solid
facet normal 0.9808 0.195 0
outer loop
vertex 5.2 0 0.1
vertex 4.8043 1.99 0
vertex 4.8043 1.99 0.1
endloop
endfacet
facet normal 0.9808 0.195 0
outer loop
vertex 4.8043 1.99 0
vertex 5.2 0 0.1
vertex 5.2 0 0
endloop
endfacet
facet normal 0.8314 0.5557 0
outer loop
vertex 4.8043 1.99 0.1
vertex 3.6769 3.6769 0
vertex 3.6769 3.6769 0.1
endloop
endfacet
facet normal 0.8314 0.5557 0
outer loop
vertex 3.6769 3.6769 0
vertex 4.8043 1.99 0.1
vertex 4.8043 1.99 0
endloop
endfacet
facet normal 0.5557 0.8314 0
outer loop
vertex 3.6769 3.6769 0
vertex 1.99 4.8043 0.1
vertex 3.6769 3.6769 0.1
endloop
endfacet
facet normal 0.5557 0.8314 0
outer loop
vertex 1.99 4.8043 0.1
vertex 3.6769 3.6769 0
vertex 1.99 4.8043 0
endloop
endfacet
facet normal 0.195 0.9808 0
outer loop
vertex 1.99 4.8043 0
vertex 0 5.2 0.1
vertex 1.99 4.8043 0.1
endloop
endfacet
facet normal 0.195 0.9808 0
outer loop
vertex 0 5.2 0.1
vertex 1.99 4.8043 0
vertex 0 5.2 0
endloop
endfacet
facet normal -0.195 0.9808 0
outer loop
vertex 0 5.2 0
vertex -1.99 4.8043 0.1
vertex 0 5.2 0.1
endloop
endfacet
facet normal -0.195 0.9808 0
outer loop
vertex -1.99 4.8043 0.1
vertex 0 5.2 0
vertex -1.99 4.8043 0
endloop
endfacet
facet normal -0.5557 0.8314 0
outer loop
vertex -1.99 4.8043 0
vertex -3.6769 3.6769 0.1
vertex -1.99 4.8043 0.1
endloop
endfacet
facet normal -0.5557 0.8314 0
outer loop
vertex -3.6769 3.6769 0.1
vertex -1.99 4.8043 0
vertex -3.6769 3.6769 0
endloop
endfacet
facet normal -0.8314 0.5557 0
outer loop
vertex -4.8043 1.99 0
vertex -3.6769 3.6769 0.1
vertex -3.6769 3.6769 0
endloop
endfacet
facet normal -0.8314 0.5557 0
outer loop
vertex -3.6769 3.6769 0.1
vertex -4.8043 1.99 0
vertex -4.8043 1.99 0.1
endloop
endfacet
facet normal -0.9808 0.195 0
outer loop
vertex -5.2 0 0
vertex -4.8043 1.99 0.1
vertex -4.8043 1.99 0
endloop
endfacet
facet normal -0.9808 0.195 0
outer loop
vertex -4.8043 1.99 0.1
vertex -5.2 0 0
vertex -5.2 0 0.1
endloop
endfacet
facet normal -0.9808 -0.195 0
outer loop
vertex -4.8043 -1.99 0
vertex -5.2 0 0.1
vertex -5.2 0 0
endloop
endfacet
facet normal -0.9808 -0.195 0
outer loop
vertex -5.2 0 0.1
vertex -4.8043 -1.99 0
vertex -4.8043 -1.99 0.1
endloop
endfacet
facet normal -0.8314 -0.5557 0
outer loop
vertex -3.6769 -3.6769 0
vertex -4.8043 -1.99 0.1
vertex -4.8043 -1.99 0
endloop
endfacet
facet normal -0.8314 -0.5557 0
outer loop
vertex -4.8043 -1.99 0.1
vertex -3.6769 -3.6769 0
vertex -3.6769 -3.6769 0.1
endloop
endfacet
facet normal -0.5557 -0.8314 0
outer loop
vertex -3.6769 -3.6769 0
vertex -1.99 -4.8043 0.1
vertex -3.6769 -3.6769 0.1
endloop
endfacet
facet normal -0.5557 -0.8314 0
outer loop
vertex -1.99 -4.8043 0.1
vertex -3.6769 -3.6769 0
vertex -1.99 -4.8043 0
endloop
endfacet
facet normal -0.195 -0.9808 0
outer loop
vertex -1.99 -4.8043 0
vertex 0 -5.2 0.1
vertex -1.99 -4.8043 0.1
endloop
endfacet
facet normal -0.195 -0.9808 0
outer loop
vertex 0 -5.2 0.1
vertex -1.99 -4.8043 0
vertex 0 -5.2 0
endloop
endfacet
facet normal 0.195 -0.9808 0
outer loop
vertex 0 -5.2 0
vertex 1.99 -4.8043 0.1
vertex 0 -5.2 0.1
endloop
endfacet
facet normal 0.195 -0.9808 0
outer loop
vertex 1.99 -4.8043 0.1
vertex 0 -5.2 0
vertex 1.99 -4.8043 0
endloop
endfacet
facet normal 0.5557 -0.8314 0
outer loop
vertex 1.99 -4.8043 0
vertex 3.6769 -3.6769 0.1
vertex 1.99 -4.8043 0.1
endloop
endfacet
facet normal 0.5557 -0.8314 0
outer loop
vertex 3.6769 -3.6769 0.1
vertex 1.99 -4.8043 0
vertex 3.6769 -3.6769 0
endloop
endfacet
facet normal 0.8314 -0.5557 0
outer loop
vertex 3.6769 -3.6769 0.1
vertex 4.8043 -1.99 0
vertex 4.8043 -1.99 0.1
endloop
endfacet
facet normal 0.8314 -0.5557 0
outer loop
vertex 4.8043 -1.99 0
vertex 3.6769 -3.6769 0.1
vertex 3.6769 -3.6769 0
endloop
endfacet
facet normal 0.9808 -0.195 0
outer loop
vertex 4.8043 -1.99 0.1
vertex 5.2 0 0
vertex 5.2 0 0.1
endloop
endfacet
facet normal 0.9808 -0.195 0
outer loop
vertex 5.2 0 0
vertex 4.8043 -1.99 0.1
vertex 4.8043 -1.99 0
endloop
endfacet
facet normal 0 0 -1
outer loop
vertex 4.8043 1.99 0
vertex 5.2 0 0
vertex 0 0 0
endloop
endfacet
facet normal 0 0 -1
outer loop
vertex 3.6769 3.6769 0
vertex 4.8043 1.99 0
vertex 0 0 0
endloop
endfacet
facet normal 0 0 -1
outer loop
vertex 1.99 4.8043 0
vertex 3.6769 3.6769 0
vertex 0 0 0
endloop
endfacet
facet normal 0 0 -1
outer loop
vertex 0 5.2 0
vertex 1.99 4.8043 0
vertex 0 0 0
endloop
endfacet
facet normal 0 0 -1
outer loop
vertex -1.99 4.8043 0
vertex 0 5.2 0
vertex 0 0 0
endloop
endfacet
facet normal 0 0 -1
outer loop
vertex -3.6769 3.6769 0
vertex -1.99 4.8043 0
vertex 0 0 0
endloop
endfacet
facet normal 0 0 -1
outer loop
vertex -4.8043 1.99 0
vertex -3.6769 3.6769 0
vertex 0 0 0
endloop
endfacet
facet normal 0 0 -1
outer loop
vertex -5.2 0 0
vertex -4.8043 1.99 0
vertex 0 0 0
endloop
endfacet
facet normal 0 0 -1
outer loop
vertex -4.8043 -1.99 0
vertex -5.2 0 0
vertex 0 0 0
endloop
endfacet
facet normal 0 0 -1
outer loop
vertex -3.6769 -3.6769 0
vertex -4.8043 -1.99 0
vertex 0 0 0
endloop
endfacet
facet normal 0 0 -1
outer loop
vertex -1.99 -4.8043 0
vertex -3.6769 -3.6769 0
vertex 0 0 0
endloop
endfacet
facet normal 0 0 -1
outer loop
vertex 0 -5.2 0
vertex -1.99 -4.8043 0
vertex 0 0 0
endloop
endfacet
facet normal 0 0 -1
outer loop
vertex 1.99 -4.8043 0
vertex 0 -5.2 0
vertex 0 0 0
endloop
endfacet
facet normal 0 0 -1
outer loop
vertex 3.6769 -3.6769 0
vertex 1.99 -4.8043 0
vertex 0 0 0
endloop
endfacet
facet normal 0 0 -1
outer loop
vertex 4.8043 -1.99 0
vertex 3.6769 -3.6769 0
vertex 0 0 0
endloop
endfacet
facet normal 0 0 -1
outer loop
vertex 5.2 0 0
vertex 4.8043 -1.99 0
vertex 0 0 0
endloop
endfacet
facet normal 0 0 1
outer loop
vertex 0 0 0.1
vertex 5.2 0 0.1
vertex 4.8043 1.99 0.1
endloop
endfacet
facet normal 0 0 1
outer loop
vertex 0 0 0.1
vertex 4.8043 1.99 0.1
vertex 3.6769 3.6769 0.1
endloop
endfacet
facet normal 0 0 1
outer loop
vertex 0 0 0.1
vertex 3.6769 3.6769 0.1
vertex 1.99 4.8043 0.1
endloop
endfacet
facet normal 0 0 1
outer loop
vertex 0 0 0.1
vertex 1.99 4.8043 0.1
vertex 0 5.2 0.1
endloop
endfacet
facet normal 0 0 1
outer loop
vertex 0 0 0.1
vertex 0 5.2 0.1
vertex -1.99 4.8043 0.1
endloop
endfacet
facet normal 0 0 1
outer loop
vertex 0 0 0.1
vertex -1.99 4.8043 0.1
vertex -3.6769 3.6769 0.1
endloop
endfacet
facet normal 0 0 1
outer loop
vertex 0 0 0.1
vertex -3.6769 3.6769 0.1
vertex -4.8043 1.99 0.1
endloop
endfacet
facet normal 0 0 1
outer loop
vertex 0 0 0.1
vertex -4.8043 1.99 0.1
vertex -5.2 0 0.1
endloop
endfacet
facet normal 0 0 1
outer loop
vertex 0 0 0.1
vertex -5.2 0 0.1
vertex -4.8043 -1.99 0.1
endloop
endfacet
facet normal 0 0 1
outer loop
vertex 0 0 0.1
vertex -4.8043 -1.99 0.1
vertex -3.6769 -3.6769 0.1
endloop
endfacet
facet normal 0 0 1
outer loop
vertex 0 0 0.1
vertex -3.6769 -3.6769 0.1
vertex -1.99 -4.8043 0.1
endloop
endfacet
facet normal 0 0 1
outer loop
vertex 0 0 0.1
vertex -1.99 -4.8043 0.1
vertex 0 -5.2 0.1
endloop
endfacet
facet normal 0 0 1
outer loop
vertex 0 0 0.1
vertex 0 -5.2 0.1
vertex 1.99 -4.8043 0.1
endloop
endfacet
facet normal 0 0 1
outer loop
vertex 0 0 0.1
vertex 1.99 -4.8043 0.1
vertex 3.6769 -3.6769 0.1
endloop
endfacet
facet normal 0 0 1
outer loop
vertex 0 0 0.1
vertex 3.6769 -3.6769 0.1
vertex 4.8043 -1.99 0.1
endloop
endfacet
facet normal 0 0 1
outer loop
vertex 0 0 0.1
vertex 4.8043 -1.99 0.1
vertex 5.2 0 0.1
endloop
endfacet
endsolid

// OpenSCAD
// file: ../p/4-4disc.scad
use <../lib.scad>
function ldraw_lib__4_4disc() = [
// 0 Disc 1.0
// 0 Name: 4-4disc.dat
// 0 Author: James Jessiman
// 0 !LDRAW_ORG Primitive UPDATE 2002-02
// 0 !LICENSE Licensed under CC BY 2.0 and CC BY 4.0 : see CAreadme.txt
// 
// 0 BFC CERTIFY CCW
  [0,"BFC","CERTIFY"],
  [0,"BFC","CCW"],
// 
// 0 !HISTORY 1998-12-15 [PTadmin] Official Update 1998-10
// 0 !HISTORY 2002-03-23 [sbliss] Added BFC statement
// 0 !HISTORY 2002-04-25 [PTadmin] Official Update 2002-02
// 0 !HISTORY 2007-06-24 [PTadmin] Header formatted for Contributor Agreement
// 0 !HISTORY 2008-07-01 [PTadmin] Official Update 2008-01
// 
// 
// 3 16 0 0 0 1 0 0 0.9239 0 0.3827
  [3,16,0,0,0,1,0,0,0.9239,0,0.3827],
// 3 16 0 0 0 0.9239 0 0.3827 0.7071 0 0.7071
  [3,16,0,0,0,0.9239,0,0.3827,0.7071,0,0.7071],
// 3 16 0 0 0 0.7071 0 0.7071 0.3827 0 0.9239
  [3,16,0,0,0,0.7071,0,0.7071,0.3827,0,0.9239],
// 3 16 0 0 0 0.3827 0 0.9239 0 0 1
  [3,16,0,0,0,0.3827,0,0.9239,0,0,1],
// 3 16 0 0 0 0 0 1 -0.3827 0 0.9239
  [3,16,0,0,0,0,0,1,-0.3827,0,0.9239],
// 3 16 0 0 0 -0.3827 0 0.9239 -0.7071 0 0.7071
  [3,16,0,0,0,-0.3827,0,0.9239,-0.7071,0,0.7071],
// 3 16 0 0 0 -0.7071 0 0.7071 -0.9239 0 0.3827
  [3,16,0,0,0,-0.7071,0,0.7071,-0.9239,0,0.3827],
// 3 16 0 0 0 -0.9239 0 0.3827 -1 0 -0
  [3,16,0,0,0,-0.9239,0,0.3827,-1,0,-0],
// 3 16 0 0 0 -1 0 -0 -0.9239 0 -0.3827
  [3,16,0,0,0,-1,0,-0,-0.9239,0,-0.3827],
// 3 16 0 0 0 -0.9239 0 -0.3827 -0.7071 0 -0.7071
  [3,16,0,0,0,-0.9239,0,-0.3827,-0.7071,0,-0.7071],
// 3 16 0 0 0 -0.7071 0 -0.7071 -0.3827 0 -0.9239
  [3,16,0,0,0,-0.7071,0,-0.7071,-0.3827,0,-0.9239],
// 3 16 0 0 0 -0.3827 0 -0.9239 0 0 -1
  [3,16,0,0,0,-0.3827,0,-0.9239,0,0,-1],
// 3 16 0 0 0 0 0 -1 0.3827 0 -0.9239
  [3,16,0,0,0,0,0,-1,0.3827,0,-0.9239],
// 3 16 0 0 0 0.3827 0 -0.9239 0.7071 0 -0.7071
  [3,16,0,0,0,0.3827,0,-0.9239,0.7071,0,-0.7071],
// 3 16 0 0 0 0.7071 0 -0.7071 0.9239 0 -0.3827
  [3,16,0,0,0,0.7071,0,-0.7071,0.9239,0,-0.3827],
// 3 16 0 0 0 0.9239 0 -0.3827 1 0 0
  [3,16,0,0,0,0.9239,0,-0.3827,1,0,0],
// 0
];
module ldraw_lib__4_4disc(step=0, col=false, unit=2/5, alt=false, line=0.2, solid=!$preview)
    makepoly(ldraw_lib__4_4disc(), step=step, col=col, unit=unit, alt=alt, line=line, solid=solid);
ldraw_lib__4_4disc(line=0.2);
// file: ../p/4-4cyli.scad
use <../lib.scad>
function ldraw_lib__4_4cyli() = [
// 0 Cylinder 1.0
// 0 Name: 4-4cyli.dat
// 0 Author: James Jessiman
// 0 !LDRAW_ORG Primitive UPDATE 2005-01
// 0 !LICENSE Licensed under CC BY 2.0 and CC BY 4.0 : see CAreadme.txt
// 
// 0 BFC CERTIFY CCW
  [0,"BFC","CERTIFY"],
  [0,"BFC","CCW"],
// 
// 0 !HISTORY 1998-12-15 [PTadmin] Official Update 1998-10
// 0 !HISTORY 2002-03-23 [sbliss] Added BFC statement; merged headers from files in distributions LDraw 0.27 and Complete.
// 0 !HISTORY 2002-04-25 [PTadmin] Official Update 2002-02
// 0 !HISTORY 2004-12-14 [guyvivan] BFC CCW
// 0 !HISTORY 2005-12-28 [PTadmin] Official Update 2005-01
// 0 !HISTORY 2007-06-24 [PTadmin] Header formatted for Contributor Agreement
// 0 !HISTORY 2008-07-01 [PTadmin] Official Update 2008-01
// 
// 
// 4 16 1 1 0 0.9239 1 0.3827 0.9239 0 0.3827 1 0 0
  [4,16,1,1,0,0.9239,1,0.3827,0.9239,0,0.3827,1,0,0],
// 5 24 1 0 0 1 1 0 0.9239 0 0.3827 0.9239 0 -0.3827
  [5,24,1,0,0,1,1,0,0.9239,0,0.3827,0.9239,0,-0.3827],
// 4 16 0.9239 1 0.3827 0.7071 1 0.7071 0.7071 0 0.7071 0.9239 0 0.3827
  [4,16,0.9239,1,0.3827,0.7071,1,0.7071,0.7071,0,0.7071,0.9239,0,0.3827],
// 5 24 0.9239 0 0.3827 0.9239 1 0.3827 0.7071 0 0.7071 1 0 0
  [5,24,0.9239,0,0.3827,0.9239,1,0.3827,0.7071,0,0.7071,1,0,0],
// 4 16 0.7071 1 0.7071 0.3827 1 0.9239 0.3827 0 0.9239 0.7071 0 0.7071
  [4,16,0.7071,1,0.7071,0.3827,1,0.9239,0.3827,0,0.9239,0.7071,0,0.7071],
// 5 24 0.7071 0 0.7071 0.7071 1 0.7071 0.3827 0 0.9239 0.9239 0 0.3827
  [5,24,0.7071,0,0.7071,0.7071,1,0.7071,0.3827,0,0.9239,0.9239,0,0.3827],
// 4 16 0.3827 1 0.9239 0 1 1 0 0 1 0.3827 0 0.9239
  [4,16,0.3827,1,0.9239,0,1,1,0,0,1,0.3827,0,0.9239],
// 5 24 0.3827 0 0.9239 0.3827 1 0.9239 0 0 1 0.7071 0 0.7071
  [5,24,0.3827,0,0.9239,0.3827,1,0.9239,0,0,1,0.7071,0,0.7071],
// 4 16 0 1 1 -0.3827 1 0.9239 -0.3827 0 0.9239 0 0 1
  [4,16,0,1,1,-0.3827,1,0.9239,-0.3827,0,0.9239,0,0,1],
// 5 24 0 0 1 0 1 1 -0.3827 0 0.9239 0.3827 0 0.9239
  [5,24,0,0,1,0,1,1,-0.3827,0,0.9239,0.3827,0,0.9239],
// 4 16 -0.3827 1 0.9239 -0.7071 1 0.7071 -0.7071 0 0.7071 -0.3827 0 0.9239
  [4,16,-0.3827,1,0.9239,-0.7071,1,0.7071,-0.7071,0,0.7071,-0.3827,0,0.9239],
// 5 24 -0.3827 0 0.9239 -0.3827 1 0.9239 -0.7071 0 0.7071 0 0 1
  [5,24,-0.3827,0,0.9239,-0.3827,1,0.9239,-0.7071,0,0.7071,0,0,1],
// 4 16 -0.7071 1 0.7071 -0.9239 1 0.3827 -0.9239 0 0.3827 -0.7071 0 0.7071
  [4,16,-0.7071,1,0.7071,-0.9239,1,0.3827,-0.9239,0,0.3827,-0.7071,0,0.7071],
// 5 24 -0.7071 0 0.7071 -0.7071 1 0.7071 -0.9239 0 0.3827 -0.3827 0 0.9239
  [5,24,-0.7071,0,0.7071,-0.7071,1,0.7071,-0.9239,0,0.3827,-0.3827,0,0.9239],
// 4 16 -0.9239 1 0.3827 -1 1 0 -1 0 0 -0.9239 0 0.3827
  [4,16,-0.9239,1,0.3827,-1,1,0,-1,0,0,-0.9239,0,0.3827],
// 5 24 -0.9239 0 0.3827 -0.9239 1 0.3827 -1 0 0 -0.7071 0 0.7071
  [5,24,-0.9239,0,0.3827,-0.9239,1,0.3827,-1,0,0,-0.7071,0,0.7071],
// 4 16 -1 1 0 -0.9239 1 -0.3827 -0.9239 0 -0.3827 -1 0 0
  [4,16,-1,1,0,-0.9239,1,-0.3827,-0.9239,0,-0.3827,-1,0,0],
// 5 24 -1 0 0 -1 1 0 -0.9239 0 -0.3827 -0.9239 0 0.3827
  [5,24,-1,0,0,-1,1,0,-0.9239,0,-0.3827,-0.9239,0,0.3827],
// 4 16 -0.9239 1 -0.3827 -0.7071 1 -0.7071 -0.7071 0 -0.7071 -0.9239 0 -0.3827
  [4,16,-0.9239,1,-0.3827,-0.7071,1,-0.7071,-0.7071,0,-0.7071,-0.9239,0,-0.3827],
// 5 24 -0.9239 0 -0.3827 -0.9239 1 -0.3827 -0.7071 0 -0.7071 -1 0 0
  [5,24,-0.9239,0,-0.3827,-0.9239,1,-0.3827,-0.7071,0,-0.7071,-1,0,0],
// 4 16 -0.7071 1 -0.7071 -0.3827 1 -0.9239 -0.3827 0 -0.9239 -0.7071 0 -0.7071
  [4,16,-0.7071,1,-0.7071,-0.3827,1,-0.9239,-0.3827,0,-0.9239,-0.7071,0,-0.7071],
// 5 24 -0.7071 0 -0.7071 -0.7071 1 -0.7071 -0.3827 0 -0.9239 -0.9239 0 -0.3827
  [5,24,-0.7071,0,-0.7071,-0.7071,1,-0.7071,-0.3827,0,-0.9239,-0.9239,0,-0.3827],
// 4 16 -0.3827 1 -0.9239 0 1 -1 0 0 -1 -0.3827 0 -0.9239
  [4,16,-0.3827,1,-0.9239,0,1,-1,0,0,-1,-0.3827,0,-0.9239],
// 5 24 -0.3827 0 -0.9239 -0.3827 1 -0.9239 0 0 -1 -0.7071 0 -0.7071
  [5,24,-0.3827,0,-0.9239,-0.3827,1,-0.9239,0,0,-1,-0.7071,0,-0.7071],
// 4 16 0 1 -1 0.3827 1 -0.9239 0.3827 0 -0.9239 0 0 -1
  [4,16,0,1,-1,0.3827,1,-0.9239,0.3827,0,-0.9239,0,0,-1],
// 5 24 0 0 -1 0 1 -1 0.3827 0 -0.9239 -0.3827 0 -0.9239
  [5,24,0,0,-1,0,1,-1,0.3827,0,-0.9239,-0.3827,0,-0.9239],
// 4 16 0.3827 1 -0.9239 0.7071 1 -0.7071 0.7071 0 -0.7071 0.3827 0 -0.9239
  [4,16,0.3827,1,-0.9239,0.7071,1,-0.7071,0.7071,0,-0.7071,0.3827,0,-0.9239],
// 5 24 0.3827 0 -0.9239 0.3827 1 -0.9239 0.7071 0 -0.7071 0 0 -1
  [5,24,0.3827,0,-0.9239,0.3827,1,-0.9239,0.7071,0,-0.7071,0,0,-1],
// 4 16 0.7071 1 -0.7071 0.9239 1 -0.3827 0.9239 0 -0.3827 0.7071 0 -0.7071
  [4,16,0.7071,1,-0.7071,0.9239,1,-0.3827,0.9239,0,-0.3827,0.7071,0,-0.7071],
// 5 24 0.7071 0 -0.7071 0.7071 1 -0.7071 0.9239 0 -0.3827 0.3827 0 -0.9239
  [5,24,0.7071,0,-0.7071,0.7071,1,-0.7071,0.9239,0,-0.3827,0.3827,0,-0.9239],
// 4 16 0.9239 1 -0.3827 1 1 0 1 0 0 0.9239 0 -0.3827
  [4,16,0.9239,1,-0.3827,1,1,0,1,0,0,0.9239,0,-0.3827],
// 5 24 0.9239 0 -0.3827 0.9239 1 -0.3827 1 0 0 0.7071 0 -0.7071
  [5,24,0.9239,0,-0.3827,0.9239,1,-0.3827,1,0,0,0.7071,0,-0.7071],
// 0
];
module ldraw_lib__4_4cyli(step=0, col=false, unit=2/5, alt=false, line=0.2, solid=!$preview)
    makepoly(ldraw_lib__4_4cyli(), step=step, col=col, unit=unit, alt=alt, line=line, solid=solid);
ldraw_lib__4_4cyli(line=0.2);
// main file
use <../lib.scad>
use <../p/4-4cyli.scad>
use <../p/4-4disc.scad>
function ldraw_lib__190085c() = [
// 0 Sticker  0.7 x  0.7 Round Mirror
// 0 Name: 190085c.dat
// 0 Author: Philippe Hurbain [Philo]
// 0 !LDRAW_ORG Part UPDATE 2019-01
// 0 !LICENSE Licensed under CC BY 2.0 and CC BY 4.0 : see CAreadme.txt
// 
// 0 BFC CERTIFY CCW
  [0,"BFC","CERTIFY"],
  [0,"BFC","CCW"],
// 
// 0 !KEYWORDS Bathroom, Homemaker, Set 261-1
// 
// 0 !HISTORY 2019-06-28 [PTadmin] Official Update 2019-01
// 
// 
// 1 16 0 0 0 13 0 0 0 -.25 0 0 0 13 4-4cyli.dat
  [1,16,0,0,0,13,0,0,0,-.25,0,0,0,13, ldraw_lib__4_4cyli()],
// 1 16 0 0 0 13 0 0 0 -1 0 0 0 13 4-4disc.dat
  [1,16,0,0,0,13,0,0,0,-1,0,0,0,13, ldraw_lib__4_4disc()],
// 1 383 0 -.25 0 13 0 0 0 1 0 0 0 13 4-4disc.dat
  [1,383,0,-.25,0,13,0,0,0,1,0,0,0,13, ldraw_lib__4_4disc()],
];
module ldraw_lib__190085c(step=0, col=false, unit=2/5, alt=false, line=0.2, solid=!$preview)
    makepoly(ldraw_lib__190085c(), step=step, col=col, unit=unit, alt=alt, line=line, solid=solid);
ldraw_lib__190085c(line=0.2);
